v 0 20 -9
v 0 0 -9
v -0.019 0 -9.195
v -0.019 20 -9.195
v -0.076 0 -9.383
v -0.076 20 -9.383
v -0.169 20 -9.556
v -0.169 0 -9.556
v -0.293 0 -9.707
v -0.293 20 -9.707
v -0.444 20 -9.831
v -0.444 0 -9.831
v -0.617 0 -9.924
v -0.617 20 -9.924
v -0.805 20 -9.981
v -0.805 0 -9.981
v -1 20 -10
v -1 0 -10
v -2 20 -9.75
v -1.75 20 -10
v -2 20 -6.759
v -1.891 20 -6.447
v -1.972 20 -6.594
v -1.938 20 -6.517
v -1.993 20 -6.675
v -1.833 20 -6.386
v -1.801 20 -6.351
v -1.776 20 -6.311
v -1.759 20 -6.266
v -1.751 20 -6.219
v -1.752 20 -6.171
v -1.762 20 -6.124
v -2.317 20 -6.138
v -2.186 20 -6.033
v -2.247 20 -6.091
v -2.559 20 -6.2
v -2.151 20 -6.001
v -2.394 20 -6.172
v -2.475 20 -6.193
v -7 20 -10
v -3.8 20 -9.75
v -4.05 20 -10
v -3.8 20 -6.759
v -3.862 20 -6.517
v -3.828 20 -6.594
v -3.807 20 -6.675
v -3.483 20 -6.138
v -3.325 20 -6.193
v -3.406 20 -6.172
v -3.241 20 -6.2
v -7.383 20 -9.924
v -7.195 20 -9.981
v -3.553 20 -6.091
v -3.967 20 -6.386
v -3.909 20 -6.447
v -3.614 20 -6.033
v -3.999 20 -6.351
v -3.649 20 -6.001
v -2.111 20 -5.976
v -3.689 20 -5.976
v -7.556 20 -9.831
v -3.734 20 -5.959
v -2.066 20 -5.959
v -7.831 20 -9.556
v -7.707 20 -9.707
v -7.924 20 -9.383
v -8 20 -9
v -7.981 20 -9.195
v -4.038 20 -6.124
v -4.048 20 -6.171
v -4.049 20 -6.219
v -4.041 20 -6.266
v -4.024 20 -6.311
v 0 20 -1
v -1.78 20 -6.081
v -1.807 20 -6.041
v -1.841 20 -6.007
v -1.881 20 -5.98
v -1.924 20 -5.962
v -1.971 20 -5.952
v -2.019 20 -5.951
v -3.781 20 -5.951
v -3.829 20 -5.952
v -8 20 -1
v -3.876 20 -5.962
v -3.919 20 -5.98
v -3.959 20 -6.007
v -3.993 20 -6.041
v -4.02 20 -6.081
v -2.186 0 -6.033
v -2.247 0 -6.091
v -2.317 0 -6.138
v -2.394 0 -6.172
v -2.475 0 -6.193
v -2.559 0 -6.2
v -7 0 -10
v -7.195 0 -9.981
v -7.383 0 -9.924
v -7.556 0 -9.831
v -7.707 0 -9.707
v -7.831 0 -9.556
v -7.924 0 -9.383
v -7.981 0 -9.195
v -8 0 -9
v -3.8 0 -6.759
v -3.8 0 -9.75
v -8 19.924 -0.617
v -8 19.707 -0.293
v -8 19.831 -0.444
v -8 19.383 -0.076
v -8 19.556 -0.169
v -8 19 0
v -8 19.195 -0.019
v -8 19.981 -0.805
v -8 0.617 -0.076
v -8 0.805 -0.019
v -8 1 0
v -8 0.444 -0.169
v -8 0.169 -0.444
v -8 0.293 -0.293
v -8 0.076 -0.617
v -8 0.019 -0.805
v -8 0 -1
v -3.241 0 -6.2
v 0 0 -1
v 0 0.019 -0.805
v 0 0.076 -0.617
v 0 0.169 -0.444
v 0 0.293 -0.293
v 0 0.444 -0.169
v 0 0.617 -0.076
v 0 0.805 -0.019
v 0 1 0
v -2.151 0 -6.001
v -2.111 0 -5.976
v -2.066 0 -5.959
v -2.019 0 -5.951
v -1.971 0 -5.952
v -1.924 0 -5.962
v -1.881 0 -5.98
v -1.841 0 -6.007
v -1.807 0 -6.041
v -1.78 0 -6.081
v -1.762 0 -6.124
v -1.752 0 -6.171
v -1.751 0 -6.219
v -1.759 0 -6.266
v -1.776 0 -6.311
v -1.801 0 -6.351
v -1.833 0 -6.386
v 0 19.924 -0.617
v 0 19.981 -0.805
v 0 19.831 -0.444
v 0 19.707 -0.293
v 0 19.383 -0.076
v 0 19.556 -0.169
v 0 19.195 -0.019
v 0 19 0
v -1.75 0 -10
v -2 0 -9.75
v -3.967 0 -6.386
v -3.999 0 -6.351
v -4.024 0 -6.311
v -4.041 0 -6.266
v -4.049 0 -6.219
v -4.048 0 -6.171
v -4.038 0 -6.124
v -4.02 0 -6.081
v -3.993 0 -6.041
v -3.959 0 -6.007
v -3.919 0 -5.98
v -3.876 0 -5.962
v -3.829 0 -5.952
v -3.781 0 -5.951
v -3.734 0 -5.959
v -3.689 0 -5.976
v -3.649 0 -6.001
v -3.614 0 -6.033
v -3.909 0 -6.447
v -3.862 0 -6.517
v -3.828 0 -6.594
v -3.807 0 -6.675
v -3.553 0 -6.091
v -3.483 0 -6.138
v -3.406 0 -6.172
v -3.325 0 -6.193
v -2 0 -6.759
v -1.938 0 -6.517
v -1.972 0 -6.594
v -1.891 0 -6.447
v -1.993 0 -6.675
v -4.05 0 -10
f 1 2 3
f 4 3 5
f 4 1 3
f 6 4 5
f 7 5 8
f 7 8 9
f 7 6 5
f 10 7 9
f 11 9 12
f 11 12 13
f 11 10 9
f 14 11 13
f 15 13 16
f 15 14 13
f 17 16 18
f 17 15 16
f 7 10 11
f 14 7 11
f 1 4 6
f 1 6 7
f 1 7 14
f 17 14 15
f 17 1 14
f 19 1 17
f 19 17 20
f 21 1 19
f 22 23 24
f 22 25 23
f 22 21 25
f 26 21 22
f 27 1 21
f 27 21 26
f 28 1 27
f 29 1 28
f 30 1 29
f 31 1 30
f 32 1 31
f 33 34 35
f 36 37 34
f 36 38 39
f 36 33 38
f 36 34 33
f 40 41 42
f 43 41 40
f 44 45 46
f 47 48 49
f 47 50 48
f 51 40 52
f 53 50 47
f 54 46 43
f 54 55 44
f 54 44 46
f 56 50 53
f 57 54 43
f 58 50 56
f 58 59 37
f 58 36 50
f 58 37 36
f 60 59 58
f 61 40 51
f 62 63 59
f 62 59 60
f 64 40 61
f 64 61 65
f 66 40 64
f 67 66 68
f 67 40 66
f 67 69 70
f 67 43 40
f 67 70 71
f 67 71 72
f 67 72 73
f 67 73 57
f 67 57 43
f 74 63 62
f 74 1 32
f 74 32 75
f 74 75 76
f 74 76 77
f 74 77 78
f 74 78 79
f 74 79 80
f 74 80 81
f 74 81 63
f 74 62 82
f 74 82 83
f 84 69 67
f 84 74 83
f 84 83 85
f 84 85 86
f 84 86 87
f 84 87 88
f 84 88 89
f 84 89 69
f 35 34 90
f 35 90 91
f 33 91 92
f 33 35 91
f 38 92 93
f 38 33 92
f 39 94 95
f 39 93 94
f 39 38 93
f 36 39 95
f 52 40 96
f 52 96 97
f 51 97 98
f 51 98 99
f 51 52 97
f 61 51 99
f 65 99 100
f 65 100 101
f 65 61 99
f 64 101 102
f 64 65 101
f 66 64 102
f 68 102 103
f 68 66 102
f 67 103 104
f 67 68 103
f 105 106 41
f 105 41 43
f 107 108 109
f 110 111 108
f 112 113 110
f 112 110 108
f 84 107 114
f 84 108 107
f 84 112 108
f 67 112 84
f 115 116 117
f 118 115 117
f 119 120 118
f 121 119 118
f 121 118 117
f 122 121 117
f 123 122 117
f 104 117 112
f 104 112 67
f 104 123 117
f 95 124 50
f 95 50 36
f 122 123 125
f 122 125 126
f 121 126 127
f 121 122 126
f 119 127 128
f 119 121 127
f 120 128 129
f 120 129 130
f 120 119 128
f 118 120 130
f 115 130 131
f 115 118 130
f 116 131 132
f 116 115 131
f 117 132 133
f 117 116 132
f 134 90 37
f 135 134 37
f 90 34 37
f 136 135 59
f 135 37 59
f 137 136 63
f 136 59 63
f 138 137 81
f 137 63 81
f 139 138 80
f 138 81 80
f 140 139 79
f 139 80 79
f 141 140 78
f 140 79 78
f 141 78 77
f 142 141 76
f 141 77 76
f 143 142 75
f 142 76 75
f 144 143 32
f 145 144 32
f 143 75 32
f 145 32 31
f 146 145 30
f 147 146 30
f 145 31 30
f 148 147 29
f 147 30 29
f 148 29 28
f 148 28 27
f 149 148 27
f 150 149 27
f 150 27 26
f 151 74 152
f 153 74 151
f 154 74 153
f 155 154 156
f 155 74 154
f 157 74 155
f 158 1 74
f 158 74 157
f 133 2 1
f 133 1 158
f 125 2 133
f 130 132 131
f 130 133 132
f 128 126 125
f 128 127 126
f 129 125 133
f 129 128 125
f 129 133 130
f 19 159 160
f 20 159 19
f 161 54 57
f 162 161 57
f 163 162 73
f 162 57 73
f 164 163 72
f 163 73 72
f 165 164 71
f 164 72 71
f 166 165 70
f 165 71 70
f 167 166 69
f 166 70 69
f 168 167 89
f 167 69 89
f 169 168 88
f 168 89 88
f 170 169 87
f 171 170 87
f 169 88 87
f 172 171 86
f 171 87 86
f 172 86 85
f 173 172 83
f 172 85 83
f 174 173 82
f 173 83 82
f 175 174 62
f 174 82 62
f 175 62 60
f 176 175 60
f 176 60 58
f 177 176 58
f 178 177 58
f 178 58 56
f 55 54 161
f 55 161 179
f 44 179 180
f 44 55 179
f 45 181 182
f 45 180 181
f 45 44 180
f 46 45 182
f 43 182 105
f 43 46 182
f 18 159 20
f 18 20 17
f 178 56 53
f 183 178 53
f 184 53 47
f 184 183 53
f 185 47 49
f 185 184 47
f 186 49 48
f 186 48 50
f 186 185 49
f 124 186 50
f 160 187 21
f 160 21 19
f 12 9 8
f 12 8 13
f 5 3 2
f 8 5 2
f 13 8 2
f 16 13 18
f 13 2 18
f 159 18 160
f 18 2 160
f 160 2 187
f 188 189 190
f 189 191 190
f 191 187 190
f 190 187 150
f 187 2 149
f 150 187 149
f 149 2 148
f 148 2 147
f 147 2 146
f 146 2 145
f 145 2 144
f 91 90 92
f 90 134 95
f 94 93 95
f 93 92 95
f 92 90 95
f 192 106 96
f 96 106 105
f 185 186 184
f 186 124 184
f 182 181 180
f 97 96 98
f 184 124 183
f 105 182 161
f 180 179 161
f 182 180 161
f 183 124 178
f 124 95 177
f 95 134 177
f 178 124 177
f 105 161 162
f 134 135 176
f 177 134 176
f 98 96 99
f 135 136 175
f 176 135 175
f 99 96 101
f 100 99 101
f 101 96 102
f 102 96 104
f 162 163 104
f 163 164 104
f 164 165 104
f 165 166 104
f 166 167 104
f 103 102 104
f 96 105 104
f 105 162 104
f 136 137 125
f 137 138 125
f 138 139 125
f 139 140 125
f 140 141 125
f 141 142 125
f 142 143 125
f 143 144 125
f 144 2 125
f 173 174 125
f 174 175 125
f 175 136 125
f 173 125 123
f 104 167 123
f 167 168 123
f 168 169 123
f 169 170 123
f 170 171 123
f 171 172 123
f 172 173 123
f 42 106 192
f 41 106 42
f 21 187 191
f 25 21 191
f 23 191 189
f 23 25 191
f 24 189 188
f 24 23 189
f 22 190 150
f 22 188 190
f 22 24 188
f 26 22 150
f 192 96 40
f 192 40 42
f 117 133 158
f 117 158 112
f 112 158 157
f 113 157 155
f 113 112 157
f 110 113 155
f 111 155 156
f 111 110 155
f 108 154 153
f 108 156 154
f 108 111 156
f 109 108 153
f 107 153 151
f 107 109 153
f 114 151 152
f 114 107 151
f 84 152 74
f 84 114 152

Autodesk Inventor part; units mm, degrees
ref_plane "YZ Plane" through (0, 0, 0) normal (1, 0, 0) x (0, 1, 0)
ref_plane "XZ Plane" through (0, 0, 0) normal (0, 1, 0) x (-1, 0, 0)
ref_plane "XY Plane" through (0, 0, 0) normal (0, 0, 1) x (1, 0, 0)
sketch "Sketch1" plane through (0, 0, 0) normal (0, 1, 0) x (-1, 0, 0)
  line L0 (0, 0) -> (8, 0)
  line L1 (8, 0) -> (8, -10)
  line L2 (0, -10) -> (0, 0)
  line L3 (3.8, -10) -> (3.8, -6.2)
  line L4 (3.8, -6.2) -> (2, -6.2)
  line L5 (2, -6.2) -> (2, -10)
  line L6 (8, -10) -> (3.8, -10)
  line L7 (2, -10) -> (0, -10)
  dimension "d0" = 1.8
  dimension "d1" = 2
  dimension "d2" = 8
  dimension "d3" = 3.8
  dimension "d4" = 3.8
  dimension "d5" = 10
extrude "Extrusion1" add sketch "Sketch1" along normal blind 20
chamfer "Chamfer1" distance 0.25 angle 45 2 edges at (-2, 10, -10) (-3.8, 10, -10)
fillet "Fillet1" radius 1 4 edges at (-4, 20, 0) (-4, 0, 0) (-8, 10, -10) (0, 10, -10)
sketch "Sketch2" plane through (0, 20, 0) normal (0, 1, 0) x (1, 0, 0)
  arc A0 (0, 9) -> (-1, 10) centre (-1, 9) ccw projected
  line L0 (-1, 10) -> (-1.75, 10) projected
  line L1 (-2, 9.75) -> (-1.75, 10) projected
  line L2 (-2, 9.75) -> (-2, 6.2) projected
  line L3 (-2, 6.2) -> (-3.8, 6.2) projected
  line L4 (-3.8, 6.2) -> (-3.8, 9.75) projected
  line L5 (-4.05, 10) -> (-3.8, 9.75) projected
  line L6 (-4.05, 10) -> (-7, 10) projected
  arc A1 (-7, 10) -> (-8, 9) centre (-7, 9) ccw projected
  line L7 (-8, 9) -> (-8, 1) projected
  line L8 (0, 1) -> (-8, 1) projected
  line L9 (0, 1) -> (0, 9) projected
  circle A2 centre (-3.8, 6.2) radius 0.25
  circle A3 centre (-2, 6.2) radius 0.25
  point P0 (0, 0)
  dimension "d12" = 0.5
extrude "Extrusion2" cut sketch "Sketch2" against normal through all contours A3 L3 L2 | L2 L3 A3 | A2 L4 L3 | L3 L4 A2
fillet "Fillet2" radius 0.5 4 edges at (-3.55, 10, -6.2) (-3.8, 10, -6.45) (-2, 10, -6.45) (-2.25, 10, -6.2)
properties part number "capSenseHolder"
